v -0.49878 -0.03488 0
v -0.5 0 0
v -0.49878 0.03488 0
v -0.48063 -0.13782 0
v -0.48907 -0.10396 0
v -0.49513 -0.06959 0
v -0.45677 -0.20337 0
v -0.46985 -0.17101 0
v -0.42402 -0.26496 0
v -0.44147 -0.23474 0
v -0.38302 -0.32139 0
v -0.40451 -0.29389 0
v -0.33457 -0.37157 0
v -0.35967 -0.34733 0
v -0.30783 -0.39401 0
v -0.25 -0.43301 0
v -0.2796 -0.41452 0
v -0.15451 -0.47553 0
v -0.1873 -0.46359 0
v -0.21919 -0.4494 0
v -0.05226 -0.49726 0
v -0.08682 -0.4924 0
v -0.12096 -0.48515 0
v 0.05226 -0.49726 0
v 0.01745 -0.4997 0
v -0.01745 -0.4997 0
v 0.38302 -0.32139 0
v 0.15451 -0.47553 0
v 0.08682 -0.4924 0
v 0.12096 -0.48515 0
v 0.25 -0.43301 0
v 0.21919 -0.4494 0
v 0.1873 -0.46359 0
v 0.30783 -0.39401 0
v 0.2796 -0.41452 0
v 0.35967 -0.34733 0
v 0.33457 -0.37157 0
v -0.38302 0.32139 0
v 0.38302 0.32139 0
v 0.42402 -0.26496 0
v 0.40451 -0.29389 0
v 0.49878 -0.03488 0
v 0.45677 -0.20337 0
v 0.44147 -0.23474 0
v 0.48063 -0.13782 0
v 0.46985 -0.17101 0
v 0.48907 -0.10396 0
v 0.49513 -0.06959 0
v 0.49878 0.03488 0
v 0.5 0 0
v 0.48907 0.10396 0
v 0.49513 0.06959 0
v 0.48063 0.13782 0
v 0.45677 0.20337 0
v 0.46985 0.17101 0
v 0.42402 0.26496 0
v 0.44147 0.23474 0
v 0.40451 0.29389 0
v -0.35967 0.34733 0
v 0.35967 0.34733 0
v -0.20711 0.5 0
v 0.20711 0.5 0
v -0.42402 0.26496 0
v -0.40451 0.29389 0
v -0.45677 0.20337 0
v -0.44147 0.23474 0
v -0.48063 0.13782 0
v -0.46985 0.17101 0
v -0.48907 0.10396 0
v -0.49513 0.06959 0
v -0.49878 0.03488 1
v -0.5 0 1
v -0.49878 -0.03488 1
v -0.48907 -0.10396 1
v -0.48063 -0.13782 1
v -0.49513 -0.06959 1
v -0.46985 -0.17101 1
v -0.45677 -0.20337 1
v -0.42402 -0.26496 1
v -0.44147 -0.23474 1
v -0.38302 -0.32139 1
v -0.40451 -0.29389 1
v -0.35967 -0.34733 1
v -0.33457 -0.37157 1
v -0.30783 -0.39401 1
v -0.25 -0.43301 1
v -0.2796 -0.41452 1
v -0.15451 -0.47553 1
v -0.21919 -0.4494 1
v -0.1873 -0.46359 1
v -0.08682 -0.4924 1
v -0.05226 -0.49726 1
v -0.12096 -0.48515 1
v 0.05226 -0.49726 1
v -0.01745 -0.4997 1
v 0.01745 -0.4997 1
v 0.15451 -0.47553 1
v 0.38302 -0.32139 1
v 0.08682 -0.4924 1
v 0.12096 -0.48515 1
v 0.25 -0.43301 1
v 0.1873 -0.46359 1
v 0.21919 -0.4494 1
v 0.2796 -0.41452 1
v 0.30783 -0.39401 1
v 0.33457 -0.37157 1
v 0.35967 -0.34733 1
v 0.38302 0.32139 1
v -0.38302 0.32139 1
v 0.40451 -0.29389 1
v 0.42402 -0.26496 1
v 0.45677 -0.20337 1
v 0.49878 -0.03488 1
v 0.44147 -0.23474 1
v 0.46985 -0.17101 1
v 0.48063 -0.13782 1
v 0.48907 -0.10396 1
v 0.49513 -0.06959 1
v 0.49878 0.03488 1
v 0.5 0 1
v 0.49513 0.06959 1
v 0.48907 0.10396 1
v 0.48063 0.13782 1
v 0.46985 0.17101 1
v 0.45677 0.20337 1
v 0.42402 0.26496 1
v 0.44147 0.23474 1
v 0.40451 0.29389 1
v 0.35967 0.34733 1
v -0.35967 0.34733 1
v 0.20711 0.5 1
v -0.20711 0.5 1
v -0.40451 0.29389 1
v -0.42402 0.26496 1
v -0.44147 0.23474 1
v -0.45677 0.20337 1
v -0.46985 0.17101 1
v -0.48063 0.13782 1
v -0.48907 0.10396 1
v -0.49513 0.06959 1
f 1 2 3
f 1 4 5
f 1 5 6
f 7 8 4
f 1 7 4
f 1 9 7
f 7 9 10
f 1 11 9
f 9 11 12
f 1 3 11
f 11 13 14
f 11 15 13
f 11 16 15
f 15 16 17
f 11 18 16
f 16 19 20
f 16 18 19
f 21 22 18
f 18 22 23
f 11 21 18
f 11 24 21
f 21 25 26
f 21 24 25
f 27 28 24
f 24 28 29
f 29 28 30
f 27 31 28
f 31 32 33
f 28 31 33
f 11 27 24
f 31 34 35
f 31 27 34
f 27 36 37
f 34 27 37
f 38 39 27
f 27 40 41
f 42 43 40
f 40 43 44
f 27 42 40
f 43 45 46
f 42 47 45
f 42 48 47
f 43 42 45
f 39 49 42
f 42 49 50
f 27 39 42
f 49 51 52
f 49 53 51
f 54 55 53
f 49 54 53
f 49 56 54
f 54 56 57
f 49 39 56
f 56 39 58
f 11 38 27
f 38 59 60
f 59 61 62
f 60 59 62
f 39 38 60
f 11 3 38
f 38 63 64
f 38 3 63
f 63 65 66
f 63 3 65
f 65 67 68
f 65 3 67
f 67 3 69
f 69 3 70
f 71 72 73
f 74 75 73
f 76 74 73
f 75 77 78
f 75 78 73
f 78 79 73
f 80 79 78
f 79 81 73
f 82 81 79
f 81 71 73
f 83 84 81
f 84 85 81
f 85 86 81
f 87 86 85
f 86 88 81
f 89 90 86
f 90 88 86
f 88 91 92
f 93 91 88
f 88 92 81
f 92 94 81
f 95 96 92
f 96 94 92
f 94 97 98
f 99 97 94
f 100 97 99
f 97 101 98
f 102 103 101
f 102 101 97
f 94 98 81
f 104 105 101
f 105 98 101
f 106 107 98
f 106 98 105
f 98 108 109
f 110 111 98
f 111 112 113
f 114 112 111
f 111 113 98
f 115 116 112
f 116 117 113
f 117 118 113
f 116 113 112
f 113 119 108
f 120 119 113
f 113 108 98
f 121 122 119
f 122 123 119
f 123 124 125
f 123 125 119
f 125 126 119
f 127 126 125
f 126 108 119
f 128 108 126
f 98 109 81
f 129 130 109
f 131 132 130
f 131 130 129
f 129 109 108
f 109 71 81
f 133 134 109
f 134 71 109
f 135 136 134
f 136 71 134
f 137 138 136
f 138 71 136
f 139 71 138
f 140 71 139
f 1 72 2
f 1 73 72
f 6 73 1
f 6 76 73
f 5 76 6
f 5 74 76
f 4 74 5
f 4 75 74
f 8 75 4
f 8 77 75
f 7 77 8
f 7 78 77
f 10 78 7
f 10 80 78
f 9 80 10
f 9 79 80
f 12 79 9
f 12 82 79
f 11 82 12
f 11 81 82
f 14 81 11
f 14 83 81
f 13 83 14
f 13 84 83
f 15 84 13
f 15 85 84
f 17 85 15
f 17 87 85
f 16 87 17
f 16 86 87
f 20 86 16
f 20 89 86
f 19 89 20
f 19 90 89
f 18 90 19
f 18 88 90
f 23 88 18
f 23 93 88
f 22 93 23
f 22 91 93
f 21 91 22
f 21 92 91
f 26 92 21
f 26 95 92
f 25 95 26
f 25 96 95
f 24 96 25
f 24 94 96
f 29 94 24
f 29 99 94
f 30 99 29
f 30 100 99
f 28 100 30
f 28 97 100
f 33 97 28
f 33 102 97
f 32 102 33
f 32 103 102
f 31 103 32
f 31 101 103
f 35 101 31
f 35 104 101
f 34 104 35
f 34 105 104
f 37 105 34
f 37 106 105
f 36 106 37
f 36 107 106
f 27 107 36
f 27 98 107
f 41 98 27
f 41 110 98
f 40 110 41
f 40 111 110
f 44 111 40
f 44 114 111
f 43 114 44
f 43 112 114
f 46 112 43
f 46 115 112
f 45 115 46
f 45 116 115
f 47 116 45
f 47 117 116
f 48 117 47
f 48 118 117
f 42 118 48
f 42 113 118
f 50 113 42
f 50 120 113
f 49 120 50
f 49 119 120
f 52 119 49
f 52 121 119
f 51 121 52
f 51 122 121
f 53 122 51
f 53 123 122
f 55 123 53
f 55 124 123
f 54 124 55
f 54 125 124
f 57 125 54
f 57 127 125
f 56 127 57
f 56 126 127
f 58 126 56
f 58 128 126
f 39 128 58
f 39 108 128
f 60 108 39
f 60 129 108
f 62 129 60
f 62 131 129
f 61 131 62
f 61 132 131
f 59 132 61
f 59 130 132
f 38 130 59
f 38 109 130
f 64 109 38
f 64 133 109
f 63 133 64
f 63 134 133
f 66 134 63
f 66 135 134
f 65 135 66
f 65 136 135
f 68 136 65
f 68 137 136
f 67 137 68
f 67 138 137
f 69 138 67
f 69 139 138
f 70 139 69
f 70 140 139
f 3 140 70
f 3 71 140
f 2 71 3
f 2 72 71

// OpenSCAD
//A module for truncated tear drops.

trunctear(1, 0.5, $fn = 90);

module trunctear(hei, radian, cent = false)
{
    linear_extrude(height = hei, center = cent)
        hull()
        {
            circle(r = radian);
            translate([0, radian/2])
                square([2*(radian*(2*cos(45)-1)), radian], center = true);
        }
}
